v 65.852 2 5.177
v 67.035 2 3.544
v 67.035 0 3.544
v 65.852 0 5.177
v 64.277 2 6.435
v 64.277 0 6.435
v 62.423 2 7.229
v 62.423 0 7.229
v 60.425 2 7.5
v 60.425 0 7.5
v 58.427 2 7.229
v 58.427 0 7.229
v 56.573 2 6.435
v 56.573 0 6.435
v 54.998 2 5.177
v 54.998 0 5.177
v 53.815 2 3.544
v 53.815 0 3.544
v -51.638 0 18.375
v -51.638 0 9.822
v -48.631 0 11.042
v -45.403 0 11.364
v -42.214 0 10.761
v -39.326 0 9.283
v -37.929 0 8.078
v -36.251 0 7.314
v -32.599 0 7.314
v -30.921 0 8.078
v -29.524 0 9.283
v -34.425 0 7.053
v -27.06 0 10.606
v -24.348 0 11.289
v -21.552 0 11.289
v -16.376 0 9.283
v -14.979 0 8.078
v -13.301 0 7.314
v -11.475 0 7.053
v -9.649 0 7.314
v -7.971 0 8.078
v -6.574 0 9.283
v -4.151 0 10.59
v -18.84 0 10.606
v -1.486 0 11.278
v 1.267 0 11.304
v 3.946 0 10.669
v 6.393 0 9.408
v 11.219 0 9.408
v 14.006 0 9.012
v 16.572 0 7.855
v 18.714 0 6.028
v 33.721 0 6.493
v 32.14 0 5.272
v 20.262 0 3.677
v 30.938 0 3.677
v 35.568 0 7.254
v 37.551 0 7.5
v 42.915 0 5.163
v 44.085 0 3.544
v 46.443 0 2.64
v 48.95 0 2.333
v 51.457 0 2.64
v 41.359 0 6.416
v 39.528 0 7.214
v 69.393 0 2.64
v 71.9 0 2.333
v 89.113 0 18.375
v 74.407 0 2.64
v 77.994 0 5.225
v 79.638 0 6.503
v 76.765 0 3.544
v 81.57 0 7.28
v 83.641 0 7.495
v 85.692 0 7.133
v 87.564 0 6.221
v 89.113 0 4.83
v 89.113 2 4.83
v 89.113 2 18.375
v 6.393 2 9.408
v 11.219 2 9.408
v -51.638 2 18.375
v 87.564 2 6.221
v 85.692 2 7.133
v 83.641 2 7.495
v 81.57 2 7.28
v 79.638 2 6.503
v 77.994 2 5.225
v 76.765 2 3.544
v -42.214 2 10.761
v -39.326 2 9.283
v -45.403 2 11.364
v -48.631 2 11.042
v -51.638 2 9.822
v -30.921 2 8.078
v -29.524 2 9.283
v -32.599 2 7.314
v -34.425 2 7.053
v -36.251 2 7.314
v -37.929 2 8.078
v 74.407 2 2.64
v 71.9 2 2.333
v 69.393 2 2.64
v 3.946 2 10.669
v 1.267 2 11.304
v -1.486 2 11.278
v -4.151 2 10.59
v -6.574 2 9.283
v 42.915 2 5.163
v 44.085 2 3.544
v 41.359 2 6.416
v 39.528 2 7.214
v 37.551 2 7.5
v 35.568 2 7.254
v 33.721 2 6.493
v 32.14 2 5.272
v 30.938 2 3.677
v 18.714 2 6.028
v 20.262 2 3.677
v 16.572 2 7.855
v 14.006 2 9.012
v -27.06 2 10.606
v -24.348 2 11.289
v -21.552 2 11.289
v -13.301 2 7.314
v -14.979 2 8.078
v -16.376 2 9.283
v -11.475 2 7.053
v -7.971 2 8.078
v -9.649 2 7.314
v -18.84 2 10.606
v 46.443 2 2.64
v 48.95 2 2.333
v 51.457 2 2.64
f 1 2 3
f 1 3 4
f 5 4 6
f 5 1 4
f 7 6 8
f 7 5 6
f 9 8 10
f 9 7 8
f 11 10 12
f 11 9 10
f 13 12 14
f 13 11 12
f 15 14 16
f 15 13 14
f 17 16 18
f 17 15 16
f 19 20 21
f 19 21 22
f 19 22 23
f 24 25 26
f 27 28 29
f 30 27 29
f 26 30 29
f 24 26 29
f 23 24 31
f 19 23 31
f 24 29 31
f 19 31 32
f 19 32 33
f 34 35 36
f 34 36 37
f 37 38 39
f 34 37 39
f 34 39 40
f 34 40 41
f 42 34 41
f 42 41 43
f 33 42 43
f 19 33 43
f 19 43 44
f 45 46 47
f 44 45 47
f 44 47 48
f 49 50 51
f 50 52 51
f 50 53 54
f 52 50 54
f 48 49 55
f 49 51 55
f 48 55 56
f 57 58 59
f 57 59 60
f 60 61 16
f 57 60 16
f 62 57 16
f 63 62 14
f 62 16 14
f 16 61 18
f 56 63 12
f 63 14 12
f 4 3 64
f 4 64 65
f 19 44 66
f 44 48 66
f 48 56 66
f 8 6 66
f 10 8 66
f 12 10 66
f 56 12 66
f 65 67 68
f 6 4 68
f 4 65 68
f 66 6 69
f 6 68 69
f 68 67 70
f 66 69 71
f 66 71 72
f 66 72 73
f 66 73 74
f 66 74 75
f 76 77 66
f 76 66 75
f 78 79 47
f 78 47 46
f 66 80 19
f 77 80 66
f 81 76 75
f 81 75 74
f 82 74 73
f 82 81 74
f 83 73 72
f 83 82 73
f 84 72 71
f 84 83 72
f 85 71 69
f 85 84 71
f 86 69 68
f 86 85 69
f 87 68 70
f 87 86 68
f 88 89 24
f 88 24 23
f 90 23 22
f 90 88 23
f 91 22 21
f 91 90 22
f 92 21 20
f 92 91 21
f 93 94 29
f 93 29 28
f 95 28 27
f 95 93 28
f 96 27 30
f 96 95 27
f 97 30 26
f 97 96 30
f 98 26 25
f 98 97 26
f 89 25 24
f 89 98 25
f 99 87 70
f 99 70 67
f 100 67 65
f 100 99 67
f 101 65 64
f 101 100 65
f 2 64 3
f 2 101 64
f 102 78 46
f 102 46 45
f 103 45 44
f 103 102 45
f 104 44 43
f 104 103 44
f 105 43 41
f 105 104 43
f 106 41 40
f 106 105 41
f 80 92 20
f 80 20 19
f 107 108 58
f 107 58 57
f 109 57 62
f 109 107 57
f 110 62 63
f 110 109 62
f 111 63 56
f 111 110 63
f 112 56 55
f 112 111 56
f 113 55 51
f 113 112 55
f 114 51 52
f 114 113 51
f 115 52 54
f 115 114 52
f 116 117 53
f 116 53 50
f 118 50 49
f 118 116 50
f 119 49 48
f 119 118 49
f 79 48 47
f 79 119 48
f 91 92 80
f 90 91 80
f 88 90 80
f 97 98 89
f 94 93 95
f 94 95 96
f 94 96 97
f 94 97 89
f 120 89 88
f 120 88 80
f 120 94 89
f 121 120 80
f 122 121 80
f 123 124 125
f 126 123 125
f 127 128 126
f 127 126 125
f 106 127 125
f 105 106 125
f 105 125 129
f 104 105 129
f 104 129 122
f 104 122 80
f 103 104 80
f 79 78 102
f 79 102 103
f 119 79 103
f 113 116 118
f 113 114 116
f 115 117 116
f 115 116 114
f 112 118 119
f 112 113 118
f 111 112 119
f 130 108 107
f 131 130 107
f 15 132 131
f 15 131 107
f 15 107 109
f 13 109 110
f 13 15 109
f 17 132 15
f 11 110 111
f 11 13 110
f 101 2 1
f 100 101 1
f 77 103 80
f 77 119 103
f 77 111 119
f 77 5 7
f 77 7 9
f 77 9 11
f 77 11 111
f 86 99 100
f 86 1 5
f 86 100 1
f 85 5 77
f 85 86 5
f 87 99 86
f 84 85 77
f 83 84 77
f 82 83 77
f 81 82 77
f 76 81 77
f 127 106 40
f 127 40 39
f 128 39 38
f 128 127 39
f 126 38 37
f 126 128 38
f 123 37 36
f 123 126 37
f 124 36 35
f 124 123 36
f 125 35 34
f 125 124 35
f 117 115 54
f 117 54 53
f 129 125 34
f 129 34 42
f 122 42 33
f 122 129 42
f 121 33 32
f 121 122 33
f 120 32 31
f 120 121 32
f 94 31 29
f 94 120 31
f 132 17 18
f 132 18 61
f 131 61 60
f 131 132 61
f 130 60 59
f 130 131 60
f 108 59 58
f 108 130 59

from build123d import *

# Parameters (mm, degrees)
BOSS_EXTRUDE1_DEPTH = 2
SKETCH3_W           = 150.539703927
SKETCH3_H           = 27.267854048
CUT_EXTRUDE2_DEPTH  = 2
FILLET2_R           = 10


with BuildPart() as part:
    # Sketch1 → Boss-Extrude1 (new body)
    with BuildSketch(Plane(origin=(0, 0, 0), x_dir=(1, 0, 0), z_dir=(0, 1, 0))):
        with BuildLine():
            Line((-52.137643745, -8.908278482), (-52.137643745, -18.874998482))
            Line((-52.137643745, -18.874998482), (89.612643745, -18.874998482))
            Line((89.612643745, -18.874998482), (89.612643745, -3.176759435))
            ThreePointArc((89.612643745, -3.176759435), (83.375, -7), (77.137356255, -3.176759435))
            ThreePointArc((77.137356255, -3.176759435), (71.9, -1.832537182), (66.662643745, -3.176759435))
            ThreePointArc((66.662643745, -3.176759435), (60.425, -7), (54.187356255, -3.176759435))
            ThreePointArc((54.187356255, -3.176759435), (48.95, -1.832537182), (43.712643745, -3.176759435))
            ThreePointArc((43.712643745, -3.176759435), (37.475, -7), (31.237356255, -3.176759435))
            Line((31.237356255, -3.176759435), (19.762356255, -3.176759435))
            Line((19.762356255, -3.176759435), (19.762356255, -8.908278482))
            Line((19.762356255, -8.908278482), (6.237643745, -8.908278482))
            ThreePointArc((6.237643745, -8.908278482), (0, -10.875), (-6.237643745, -8.908278482))
            ThreePointArc((-6.237643745, -8.908278482), (-11.475, -6.552640597), (-16.712356255, -8.908278482))
            ThreePointArc((-16.712356255, -8.908278482), (-22.95, -10.875), (-29.187643745, -8.908278482))
            ThreePointArc((-29.187643745, -8.908278482), (-34.425, -6.552640597), (-39.662356255, -8.908278482))
            ThreePointArc((-39.662356255, -8.908278482), (-45.9, -10.875), (-52.137643745, -8.908278482))
        make_face()
    extrude(amount=BOSS_EXTRUDE1_DEPTH)

    # Sketch3 → Cut-Extrude2 (cut)
    with BuildSketch(Plane(origin=(0, 2, 0), x_dir=(1, 0, 0), z_dir=(0, 1, 0))):
        with Locations((17.759945942, -9.959763718)):
            Rectangle(SKETCH3_W, SKETCH3_H)
        with BuildLine():
            Line((89.112643745, -18.374998482), (89.112643745, -4.83005634))
            ThreePointArc((89.112643745, -4.83005634), (82.598017349, -7.459644627), (76.765134062, -3.543962794))
            ThreePointArc((76.765134062, -3.543962794), (71.9, -2.332537182), (67.034865938, -3.543962794))
            ThreePointArc((67.034865938, -3.543962794), (60.425, -7.5), (53.815134062, -3.543962794))
            ThreePointArc((53.815134062, -3.543962794), (48.95, -2.332537182), (44.084865938, -3.543962794))
            ThreePointArc((44.084865938, -3.543962794), (37.550754129, -7.499617411), (30.938071053, -3.676759435))
            Line((30.938071053, -3.676759435), (20.262356255, -3.676759435))
            Line((20.262356255, -3.676759435), (20.262356255, -9.408278482))
            Line((20.262356255, -9.408278482), (6.393349749, -9.408278482))
            ThreePointArc((6.393349749, -9.408278482), (-0.109944429, -11.374468657), (-6.574017094, -9.282937264))
            ThreePointArc((-6.574017094, -9.282937264), (-11.475, -7.052640597), (-16.375982906, -9.282937264))
            ThreePointArc((-16.375982906, -9.282937264), (-22.95, -11.375), (-29.524017094, -9.282937264))
            ThreePointArc((-29.524017094, -9.282937264), (-34.425, -7.052640597), (-39.325982906, -9.282937264))
            ThreePointArc((-39.325982906, -9.282937264), (-45.402501157, -11.364115447), (-51.637643745, -9.821917799))
            Line((-51.637643745, -9.821917799), (-51.637643745, -18.374998482))
            Line((-51.637643745, -18.374998482), (89.112643745, -18.374998482))
        make_face(mode=Mode.SUBTRACT)
    extrude(amount=-CUT_EXTRUDE2_DEPTH, mode=Mode.SUBTRACT)

    # Fillet2
    # the kernel refuses this fillet: 10 mm, written as the material it adds along each edge
    with BuildSketch(Plane(origin=(20.262356255, 2, 9.408278482), x_dir=(-1, 0, 0), z_dir=(0, -1, 0))) as fillet2_piece_1:
        with BuildLine():
            CenterArc((9.043233401, 10), FILLET2_R, 205.267698006, 64.732301994)
            Line((0, 5.731519047), (-0.180864668, 5.646149428))
            ThreePointArc((-0.180864668, 5.646149428), (-0.2, 2.865759523), (-0.2, 0))
            Line((-0.2, 0), (0, -0.2))
            Line((0, -0.2), (9.043233401, -0.2))
            Line((9.043233401, -0.2), (9.043233401, 0))
        make_face()
    extrude(amount=2)


solid = part.part
